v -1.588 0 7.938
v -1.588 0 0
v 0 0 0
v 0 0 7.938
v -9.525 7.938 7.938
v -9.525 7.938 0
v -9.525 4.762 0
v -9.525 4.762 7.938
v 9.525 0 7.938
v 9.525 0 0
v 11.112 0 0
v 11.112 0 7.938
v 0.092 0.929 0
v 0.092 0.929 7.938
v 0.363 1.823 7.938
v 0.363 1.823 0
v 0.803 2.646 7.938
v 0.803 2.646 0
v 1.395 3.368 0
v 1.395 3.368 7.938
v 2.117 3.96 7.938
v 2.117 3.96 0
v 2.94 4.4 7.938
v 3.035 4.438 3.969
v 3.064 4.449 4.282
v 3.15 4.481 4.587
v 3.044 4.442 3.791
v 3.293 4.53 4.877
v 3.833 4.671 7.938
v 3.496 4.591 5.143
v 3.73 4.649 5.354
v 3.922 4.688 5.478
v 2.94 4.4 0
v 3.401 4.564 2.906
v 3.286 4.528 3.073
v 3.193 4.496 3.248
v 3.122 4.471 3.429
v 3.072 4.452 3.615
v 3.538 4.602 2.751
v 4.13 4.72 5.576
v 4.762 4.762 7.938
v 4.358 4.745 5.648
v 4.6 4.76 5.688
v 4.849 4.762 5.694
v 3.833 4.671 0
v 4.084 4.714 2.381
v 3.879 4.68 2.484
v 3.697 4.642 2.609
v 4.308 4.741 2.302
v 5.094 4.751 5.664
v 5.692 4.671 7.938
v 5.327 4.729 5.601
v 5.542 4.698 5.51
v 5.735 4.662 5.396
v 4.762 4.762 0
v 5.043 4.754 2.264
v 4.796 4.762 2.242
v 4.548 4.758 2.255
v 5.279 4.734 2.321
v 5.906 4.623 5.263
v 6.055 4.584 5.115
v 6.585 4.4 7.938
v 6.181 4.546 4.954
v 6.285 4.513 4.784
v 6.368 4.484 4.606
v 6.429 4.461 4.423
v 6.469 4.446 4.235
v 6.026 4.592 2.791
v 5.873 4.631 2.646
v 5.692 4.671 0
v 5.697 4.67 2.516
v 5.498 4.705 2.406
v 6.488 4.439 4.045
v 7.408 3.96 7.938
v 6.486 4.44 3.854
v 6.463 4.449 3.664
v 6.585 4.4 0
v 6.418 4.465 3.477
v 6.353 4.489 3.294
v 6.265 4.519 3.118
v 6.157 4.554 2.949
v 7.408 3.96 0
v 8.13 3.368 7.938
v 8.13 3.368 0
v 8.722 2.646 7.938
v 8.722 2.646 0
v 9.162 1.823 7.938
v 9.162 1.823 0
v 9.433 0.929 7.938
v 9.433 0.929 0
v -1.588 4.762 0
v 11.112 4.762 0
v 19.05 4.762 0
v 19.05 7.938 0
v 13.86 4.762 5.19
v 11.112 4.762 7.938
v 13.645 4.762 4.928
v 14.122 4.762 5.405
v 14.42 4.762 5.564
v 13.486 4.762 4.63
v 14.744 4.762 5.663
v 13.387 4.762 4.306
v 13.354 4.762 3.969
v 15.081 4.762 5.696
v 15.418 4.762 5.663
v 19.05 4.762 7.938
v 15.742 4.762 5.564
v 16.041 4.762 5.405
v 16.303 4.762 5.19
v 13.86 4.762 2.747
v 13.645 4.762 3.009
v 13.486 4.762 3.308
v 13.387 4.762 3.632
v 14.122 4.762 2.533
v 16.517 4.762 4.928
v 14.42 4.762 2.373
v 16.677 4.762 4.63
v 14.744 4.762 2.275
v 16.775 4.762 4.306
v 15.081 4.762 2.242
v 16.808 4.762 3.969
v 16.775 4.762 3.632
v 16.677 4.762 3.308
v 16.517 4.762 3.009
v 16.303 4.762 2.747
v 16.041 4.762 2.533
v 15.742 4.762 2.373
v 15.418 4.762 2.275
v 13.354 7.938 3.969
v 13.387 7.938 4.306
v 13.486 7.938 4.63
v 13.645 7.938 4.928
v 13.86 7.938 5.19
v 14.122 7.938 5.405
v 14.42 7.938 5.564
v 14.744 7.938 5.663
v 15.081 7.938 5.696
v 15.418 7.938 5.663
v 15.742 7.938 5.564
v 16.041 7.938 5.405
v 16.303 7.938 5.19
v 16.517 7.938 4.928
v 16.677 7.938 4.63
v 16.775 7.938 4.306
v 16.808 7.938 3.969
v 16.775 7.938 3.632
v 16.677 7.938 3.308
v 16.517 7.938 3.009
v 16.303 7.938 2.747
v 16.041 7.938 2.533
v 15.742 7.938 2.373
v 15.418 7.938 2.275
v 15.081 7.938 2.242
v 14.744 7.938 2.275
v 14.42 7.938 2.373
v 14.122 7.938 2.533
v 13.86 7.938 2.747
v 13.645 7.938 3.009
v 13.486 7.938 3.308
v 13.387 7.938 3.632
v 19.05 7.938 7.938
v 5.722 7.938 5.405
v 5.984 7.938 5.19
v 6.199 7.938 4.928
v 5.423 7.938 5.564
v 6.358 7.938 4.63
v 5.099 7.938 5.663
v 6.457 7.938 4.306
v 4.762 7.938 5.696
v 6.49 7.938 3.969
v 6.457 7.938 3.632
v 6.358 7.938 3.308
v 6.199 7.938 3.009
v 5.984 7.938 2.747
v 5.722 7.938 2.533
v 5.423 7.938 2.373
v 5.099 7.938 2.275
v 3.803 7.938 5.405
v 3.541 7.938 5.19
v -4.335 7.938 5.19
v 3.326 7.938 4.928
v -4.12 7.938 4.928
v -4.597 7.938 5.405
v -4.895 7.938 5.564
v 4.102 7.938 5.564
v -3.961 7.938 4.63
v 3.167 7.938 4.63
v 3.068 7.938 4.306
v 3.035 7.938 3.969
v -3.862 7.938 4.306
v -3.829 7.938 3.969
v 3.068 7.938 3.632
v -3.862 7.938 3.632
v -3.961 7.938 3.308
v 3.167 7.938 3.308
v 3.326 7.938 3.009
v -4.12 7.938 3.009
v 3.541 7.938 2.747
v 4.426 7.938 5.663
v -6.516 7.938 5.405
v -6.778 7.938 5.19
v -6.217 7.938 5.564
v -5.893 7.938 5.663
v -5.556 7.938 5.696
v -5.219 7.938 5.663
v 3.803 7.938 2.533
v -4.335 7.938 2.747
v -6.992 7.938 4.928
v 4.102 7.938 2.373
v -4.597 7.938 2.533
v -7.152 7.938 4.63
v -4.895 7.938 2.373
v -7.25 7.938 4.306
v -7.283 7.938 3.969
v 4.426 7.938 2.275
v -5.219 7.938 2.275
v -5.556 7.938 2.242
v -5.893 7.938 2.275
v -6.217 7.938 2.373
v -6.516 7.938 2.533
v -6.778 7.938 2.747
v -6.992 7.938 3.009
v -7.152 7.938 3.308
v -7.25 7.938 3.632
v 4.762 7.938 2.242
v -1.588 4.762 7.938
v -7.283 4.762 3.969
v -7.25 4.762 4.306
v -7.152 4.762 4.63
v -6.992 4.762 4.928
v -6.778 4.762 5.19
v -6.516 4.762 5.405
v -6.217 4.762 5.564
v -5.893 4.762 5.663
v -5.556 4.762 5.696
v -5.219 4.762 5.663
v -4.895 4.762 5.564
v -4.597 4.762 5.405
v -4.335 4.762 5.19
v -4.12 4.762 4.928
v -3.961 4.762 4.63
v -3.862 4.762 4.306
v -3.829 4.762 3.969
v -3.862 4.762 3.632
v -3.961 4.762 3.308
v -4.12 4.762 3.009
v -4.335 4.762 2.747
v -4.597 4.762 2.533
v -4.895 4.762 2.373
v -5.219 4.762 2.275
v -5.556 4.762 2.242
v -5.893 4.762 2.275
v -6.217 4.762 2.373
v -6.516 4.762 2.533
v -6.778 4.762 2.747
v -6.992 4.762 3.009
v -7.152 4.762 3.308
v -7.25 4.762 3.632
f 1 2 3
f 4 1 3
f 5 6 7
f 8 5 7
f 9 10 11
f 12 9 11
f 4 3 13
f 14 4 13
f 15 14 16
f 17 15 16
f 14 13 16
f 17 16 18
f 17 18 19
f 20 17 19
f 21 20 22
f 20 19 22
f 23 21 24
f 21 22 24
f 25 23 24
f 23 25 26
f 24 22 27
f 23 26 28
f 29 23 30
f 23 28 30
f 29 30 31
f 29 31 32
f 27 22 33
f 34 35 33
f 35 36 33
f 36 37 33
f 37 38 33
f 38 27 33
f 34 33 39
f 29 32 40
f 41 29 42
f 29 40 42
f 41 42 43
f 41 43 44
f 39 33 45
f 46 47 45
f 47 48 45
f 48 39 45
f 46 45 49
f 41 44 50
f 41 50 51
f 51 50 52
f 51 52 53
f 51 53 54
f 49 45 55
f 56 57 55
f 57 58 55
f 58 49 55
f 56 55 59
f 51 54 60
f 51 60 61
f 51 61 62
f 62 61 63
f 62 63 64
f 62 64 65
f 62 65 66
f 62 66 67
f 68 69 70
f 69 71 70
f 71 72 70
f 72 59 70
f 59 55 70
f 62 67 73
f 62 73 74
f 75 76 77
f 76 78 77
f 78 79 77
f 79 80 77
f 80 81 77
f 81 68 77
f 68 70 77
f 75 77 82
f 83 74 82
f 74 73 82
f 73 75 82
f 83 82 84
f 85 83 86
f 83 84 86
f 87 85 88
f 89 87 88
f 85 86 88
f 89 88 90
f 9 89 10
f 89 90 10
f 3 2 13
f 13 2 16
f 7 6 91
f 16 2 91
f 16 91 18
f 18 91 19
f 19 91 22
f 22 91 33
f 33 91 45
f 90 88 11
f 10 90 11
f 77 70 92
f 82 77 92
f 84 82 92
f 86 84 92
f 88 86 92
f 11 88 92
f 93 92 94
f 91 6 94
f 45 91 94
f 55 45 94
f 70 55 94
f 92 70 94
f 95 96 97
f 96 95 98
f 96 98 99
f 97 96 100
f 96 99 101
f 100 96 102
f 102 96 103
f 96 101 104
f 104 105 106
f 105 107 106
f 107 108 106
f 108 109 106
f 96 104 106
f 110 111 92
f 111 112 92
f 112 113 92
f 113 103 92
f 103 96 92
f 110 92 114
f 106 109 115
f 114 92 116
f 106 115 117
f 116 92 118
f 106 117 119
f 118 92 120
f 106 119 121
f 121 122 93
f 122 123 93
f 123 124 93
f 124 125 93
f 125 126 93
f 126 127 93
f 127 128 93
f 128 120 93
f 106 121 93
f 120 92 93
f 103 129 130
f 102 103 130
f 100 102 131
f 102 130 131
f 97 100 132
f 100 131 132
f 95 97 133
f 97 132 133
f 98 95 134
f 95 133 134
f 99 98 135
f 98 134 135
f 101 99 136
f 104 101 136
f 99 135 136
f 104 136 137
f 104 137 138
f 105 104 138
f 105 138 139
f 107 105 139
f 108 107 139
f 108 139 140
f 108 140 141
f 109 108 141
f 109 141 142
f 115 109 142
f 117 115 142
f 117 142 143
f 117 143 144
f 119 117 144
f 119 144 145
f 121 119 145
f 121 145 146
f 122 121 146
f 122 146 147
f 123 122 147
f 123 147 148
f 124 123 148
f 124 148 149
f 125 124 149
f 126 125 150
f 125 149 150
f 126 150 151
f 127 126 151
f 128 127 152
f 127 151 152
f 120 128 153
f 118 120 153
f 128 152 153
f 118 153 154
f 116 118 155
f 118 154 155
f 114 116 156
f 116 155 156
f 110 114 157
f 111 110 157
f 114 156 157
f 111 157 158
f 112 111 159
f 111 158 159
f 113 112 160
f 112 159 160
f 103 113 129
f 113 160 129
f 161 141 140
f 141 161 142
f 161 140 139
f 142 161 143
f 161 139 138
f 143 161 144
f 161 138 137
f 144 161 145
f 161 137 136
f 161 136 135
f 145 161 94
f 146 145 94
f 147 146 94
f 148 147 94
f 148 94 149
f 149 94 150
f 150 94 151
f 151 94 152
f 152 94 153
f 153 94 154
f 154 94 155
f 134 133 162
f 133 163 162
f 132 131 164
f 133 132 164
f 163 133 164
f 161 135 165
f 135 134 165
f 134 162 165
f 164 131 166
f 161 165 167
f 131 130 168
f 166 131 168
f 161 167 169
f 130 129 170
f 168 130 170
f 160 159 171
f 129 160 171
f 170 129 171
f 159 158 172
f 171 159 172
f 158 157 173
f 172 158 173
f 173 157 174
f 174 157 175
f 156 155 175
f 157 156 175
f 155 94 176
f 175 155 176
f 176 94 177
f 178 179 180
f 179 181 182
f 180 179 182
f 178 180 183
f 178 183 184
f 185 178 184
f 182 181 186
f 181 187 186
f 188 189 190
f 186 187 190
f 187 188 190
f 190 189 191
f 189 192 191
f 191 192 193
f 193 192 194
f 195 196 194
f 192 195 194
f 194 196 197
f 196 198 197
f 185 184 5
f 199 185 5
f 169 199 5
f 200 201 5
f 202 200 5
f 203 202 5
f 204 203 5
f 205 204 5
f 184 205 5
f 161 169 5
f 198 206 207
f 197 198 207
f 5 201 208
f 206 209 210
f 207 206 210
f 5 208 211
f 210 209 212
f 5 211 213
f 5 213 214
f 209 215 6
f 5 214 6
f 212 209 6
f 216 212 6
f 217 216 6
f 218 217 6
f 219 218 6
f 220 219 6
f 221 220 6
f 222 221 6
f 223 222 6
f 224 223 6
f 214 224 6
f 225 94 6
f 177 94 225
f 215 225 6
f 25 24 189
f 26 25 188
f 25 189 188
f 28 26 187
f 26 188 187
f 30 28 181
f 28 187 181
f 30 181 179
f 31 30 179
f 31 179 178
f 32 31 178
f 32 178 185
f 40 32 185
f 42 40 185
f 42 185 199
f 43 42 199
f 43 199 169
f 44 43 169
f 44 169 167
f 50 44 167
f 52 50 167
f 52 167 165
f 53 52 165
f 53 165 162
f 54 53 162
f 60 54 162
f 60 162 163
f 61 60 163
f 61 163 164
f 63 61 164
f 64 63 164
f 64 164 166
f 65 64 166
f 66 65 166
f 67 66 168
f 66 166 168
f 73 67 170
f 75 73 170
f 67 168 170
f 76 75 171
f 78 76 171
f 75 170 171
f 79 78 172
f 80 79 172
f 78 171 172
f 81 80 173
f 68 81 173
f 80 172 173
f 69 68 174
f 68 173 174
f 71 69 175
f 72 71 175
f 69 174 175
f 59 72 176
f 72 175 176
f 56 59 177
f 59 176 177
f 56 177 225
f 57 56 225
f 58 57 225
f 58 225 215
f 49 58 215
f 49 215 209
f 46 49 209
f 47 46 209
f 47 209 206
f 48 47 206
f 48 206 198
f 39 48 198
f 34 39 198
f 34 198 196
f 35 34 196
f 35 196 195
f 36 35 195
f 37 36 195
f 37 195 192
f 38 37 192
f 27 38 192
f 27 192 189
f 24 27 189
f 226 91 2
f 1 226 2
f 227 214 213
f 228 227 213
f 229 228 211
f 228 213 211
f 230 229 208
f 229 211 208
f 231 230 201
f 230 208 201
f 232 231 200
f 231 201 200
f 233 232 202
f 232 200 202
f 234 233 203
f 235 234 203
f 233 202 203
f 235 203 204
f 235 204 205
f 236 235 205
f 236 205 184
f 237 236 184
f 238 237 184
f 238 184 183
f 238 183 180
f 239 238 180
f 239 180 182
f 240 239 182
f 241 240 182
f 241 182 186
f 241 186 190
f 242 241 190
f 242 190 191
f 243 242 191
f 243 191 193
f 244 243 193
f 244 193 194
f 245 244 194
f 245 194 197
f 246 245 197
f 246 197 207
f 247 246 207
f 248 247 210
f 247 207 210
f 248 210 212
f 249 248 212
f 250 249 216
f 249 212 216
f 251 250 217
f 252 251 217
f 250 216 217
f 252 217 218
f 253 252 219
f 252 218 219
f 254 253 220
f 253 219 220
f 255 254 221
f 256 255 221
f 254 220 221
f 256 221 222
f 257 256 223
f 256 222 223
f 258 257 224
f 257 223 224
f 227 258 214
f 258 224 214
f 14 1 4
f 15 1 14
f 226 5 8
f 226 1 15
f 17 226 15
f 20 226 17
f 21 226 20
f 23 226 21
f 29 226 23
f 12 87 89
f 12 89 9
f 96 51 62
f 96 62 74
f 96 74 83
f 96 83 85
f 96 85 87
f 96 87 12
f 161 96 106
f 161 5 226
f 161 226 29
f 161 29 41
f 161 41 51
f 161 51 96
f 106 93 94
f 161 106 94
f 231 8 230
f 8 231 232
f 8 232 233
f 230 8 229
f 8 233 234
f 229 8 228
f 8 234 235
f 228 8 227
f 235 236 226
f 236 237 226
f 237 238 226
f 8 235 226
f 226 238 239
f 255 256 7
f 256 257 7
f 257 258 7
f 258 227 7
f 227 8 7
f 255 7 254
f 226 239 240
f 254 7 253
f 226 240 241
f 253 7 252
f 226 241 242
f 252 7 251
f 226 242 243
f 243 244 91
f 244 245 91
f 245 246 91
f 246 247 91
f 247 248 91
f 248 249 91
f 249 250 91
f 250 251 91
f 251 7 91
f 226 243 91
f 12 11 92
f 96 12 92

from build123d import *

# Parameters (mm, degrees)
F1_DEPTH = 7.9375
F2_R     = 1.7272
F3_DEPTH = 7.9375


with BuildPart() as f1:
    # F0 (on Top) → F1 (new body)
    with BuildSketch(Plane.XY):
        with BuildLine():
            ThreePointArc((0, 0), (4.7625, 4.7625), (9.525, 0))
            Line((9.525, 0), (11.1125, 0))
            Line((11.1125, 0), (11.1125, 4.7625))
            Line((11.1125, 4.7625), (19.05, 4.7625))
            Line((19.05, 4.7625), (19.05, 7.9375))
            Line((19.05, 7.9375), (-9.525, 7.9375))
            Line((-9.525, 7.9375), (-9.525, 4.7625))
            Line((-9.525, 4.7625), (-1.5875, 4.7625))
            Line((-1.5875, 4.7625), (-1.5875, 0))
            Line((-1.5875, 0), (0, 0))
        make_face()
    extrude(amount=F1_DEPTH)

    # F2 (on face) → F3 (cut, through all)
    with BuildSketch(Plane(origin=(0, 7.9375, 0), x_dir=(-1, 0, 0), z_dir=(0, 1, 0))):
        with Locations((5.55625, 3.96875)):
            Circle(F2_R)
        with Locations((-15.08125, 3.96875)):
            Circle(F2_R)
        with Locations((-4.7625, 3.96875)):
            Circle(F2_R)
    extrude(amount=-F3_DEPTH, mode=Mode.SUBTRACT)


solid = f1.part
